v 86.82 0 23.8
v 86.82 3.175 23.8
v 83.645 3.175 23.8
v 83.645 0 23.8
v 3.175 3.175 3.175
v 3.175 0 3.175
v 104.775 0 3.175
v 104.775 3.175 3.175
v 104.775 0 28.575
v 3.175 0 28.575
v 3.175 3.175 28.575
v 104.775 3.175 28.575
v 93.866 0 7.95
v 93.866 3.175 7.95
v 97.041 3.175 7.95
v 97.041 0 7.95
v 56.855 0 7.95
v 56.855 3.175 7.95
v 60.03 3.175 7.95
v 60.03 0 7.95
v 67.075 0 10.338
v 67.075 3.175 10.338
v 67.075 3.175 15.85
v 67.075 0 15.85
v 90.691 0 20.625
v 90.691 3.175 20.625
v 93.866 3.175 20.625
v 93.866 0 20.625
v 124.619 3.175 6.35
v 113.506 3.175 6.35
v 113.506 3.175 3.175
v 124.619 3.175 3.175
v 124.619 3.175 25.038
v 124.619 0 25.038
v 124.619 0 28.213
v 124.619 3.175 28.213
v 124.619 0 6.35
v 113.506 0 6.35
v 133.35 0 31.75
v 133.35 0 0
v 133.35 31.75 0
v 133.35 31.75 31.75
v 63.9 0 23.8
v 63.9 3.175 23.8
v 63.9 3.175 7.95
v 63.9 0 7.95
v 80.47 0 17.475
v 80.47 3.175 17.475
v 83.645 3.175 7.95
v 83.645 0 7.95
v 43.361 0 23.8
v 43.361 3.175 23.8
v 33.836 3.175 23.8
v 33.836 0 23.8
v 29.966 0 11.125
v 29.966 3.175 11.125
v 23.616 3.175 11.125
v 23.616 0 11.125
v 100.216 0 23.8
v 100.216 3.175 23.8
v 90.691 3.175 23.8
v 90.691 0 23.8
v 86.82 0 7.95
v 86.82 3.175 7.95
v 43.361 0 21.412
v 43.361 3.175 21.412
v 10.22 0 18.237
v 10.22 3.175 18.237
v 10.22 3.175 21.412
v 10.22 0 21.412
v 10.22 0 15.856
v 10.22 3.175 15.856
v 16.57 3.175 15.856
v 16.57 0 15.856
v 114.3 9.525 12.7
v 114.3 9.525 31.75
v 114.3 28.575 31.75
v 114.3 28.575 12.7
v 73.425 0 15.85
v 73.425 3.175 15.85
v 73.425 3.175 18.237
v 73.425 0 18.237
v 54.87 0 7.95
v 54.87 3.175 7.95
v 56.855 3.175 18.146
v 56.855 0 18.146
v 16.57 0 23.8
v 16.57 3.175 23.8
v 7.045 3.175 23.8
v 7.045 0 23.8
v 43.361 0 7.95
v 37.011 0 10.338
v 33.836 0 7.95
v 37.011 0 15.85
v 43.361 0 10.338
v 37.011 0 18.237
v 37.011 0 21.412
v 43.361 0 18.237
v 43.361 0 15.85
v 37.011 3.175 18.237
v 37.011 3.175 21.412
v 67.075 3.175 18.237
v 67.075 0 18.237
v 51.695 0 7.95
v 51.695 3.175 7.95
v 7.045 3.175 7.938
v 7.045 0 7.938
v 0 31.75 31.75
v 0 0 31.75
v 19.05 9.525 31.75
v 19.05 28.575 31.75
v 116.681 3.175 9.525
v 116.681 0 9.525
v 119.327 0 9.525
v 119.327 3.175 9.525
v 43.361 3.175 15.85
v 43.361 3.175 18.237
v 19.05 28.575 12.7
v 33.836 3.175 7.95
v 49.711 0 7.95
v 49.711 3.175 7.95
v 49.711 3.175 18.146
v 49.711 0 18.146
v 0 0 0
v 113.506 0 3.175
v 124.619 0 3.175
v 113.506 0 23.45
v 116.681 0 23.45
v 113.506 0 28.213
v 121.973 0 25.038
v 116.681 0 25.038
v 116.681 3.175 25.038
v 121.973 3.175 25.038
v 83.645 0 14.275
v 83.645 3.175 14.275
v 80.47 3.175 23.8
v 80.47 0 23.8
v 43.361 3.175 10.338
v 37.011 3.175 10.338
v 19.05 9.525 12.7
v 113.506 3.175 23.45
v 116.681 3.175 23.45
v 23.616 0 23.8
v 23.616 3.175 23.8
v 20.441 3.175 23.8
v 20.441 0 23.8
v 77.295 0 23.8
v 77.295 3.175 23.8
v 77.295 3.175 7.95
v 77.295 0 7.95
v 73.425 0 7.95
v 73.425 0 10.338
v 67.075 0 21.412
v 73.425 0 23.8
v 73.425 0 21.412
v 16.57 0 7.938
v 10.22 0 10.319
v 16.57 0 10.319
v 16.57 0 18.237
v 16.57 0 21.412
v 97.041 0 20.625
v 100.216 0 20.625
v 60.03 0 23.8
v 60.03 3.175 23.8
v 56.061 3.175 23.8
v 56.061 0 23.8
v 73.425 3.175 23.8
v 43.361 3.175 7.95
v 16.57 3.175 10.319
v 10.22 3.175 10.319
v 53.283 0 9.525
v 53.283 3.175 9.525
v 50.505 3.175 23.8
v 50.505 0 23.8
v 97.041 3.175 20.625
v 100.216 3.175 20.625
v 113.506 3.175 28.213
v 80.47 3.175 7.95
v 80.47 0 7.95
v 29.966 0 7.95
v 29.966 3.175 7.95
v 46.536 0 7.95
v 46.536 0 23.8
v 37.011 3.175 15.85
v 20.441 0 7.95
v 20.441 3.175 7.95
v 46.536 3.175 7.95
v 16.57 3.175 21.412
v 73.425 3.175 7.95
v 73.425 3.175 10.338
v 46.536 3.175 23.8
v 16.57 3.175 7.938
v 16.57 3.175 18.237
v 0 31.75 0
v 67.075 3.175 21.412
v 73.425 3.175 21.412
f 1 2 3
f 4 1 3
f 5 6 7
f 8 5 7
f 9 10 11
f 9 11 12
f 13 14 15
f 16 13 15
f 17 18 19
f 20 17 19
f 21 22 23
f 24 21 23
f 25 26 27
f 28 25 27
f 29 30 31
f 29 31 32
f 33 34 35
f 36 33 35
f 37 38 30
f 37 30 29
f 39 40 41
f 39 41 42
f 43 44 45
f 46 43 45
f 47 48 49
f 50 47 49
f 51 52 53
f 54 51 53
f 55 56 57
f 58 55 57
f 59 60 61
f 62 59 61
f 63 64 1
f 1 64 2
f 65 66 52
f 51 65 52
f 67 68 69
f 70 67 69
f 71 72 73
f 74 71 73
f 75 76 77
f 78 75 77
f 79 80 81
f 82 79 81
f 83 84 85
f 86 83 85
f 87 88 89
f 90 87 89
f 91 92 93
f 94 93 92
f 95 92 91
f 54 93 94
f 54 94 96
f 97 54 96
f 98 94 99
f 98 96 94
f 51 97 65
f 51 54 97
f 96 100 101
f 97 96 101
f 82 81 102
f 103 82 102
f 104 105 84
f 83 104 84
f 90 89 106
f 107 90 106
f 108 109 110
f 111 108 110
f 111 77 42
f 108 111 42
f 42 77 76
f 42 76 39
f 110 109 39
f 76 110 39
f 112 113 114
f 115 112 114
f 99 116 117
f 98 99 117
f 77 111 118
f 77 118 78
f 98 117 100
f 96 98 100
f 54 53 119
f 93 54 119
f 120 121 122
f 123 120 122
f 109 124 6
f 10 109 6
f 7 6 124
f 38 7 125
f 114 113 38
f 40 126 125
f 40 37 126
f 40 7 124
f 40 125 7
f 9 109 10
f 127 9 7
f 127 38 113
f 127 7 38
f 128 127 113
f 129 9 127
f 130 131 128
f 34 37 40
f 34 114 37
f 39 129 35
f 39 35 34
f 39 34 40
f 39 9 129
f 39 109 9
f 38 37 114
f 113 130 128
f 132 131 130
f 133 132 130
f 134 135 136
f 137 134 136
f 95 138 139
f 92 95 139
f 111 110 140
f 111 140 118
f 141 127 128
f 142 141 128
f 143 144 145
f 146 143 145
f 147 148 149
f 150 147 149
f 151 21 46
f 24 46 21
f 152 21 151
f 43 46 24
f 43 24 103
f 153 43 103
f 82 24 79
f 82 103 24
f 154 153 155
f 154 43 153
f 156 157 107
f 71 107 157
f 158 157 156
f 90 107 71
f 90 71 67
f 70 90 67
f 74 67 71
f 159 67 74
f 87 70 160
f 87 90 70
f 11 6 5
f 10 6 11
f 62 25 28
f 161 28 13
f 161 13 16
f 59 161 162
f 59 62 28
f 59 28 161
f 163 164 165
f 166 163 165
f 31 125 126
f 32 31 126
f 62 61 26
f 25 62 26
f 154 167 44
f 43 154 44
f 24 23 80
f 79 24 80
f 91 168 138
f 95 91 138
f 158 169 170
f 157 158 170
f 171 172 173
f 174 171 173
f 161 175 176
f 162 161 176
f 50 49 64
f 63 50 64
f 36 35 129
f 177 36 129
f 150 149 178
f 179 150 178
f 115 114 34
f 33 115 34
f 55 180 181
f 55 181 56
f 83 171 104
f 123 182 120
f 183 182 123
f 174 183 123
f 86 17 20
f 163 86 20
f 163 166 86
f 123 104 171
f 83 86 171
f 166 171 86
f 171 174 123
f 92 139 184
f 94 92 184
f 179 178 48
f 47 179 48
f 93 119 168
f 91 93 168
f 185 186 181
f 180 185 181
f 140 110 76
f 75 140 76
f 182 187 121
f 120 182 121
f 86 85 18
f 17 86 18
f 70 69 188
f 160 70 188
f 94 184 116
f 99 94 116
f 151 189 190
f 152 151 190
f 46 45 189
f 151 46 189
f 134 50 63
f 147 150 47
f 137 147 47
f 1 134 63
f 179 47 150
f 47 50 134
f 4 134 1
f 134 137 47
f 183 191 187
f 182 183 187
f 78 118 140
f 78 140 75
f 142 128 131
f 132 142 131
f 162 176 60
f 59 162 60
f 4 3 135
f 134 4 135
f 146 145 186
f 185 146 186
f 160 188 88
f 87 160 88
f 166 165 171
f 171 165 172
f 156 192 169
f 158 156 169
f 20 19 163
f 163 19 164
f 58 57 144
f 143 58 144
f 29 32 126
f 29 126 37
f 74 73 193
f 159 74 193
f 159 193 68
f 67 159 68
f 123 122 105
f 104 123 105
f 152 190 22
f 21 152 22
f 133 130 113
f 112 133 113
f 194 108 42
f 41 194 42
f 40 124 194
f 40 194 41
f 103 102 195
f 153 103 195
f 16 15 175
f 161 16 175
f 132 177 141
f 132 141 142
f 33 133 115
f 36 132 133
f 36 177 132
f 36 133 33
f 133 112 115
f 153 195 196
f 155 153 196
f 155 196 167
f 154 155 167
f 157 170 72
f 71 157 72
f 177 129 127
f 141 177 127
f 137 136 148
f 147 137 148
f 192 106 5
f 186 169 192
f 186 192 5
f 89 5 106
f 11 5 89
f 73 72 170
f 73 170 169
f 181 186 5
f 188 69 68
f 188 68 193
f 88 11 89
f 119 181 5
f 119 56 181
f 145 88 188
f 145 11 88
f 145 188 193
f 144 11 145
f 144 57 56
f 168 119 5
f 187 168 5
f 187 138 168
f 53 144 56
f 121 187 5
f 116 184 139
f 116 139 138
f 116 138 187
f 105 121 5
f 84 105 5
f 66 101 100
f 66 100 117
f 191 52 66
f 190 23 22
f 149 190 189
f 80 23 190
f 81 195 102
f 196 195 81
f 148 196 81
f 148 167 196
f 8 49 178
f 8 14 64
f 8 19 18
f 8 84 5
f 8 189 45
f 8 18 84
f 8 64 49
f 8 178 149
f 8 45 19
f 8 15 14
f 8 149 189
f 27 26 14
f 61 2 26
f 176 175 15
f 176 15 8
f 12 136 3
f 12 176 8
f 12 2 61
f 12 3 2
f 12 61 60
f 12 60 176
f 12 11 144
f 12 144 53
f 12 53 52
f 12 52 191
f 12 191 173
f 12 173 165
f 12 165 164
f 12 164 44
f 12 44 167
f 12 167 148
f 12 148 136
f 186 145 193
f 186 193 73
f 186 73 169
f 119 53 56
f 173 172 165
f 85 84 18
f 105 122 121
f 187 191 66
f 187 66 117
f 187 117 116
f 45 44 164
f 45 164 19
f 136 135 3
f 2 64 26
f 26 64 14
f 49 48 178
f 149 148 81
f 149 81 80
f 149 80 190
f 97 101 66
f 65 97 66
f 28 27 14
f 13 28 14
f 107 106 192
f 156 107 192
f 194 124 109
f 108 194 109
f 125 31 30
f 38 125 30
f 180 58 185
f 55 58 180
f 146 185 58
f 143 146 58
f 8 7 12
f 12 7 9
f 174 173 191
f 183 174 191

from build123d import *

# Parameters (mm, degrees)
F0_W      = 133.35
F0_H      = 31.75
F1_DEPTH  = 31.75
F2_W      = 101.6
F2_H      = 25.4
F3_DEPTH  = 3.175
F5_DEPTH  = 3.175
F6_W      = 11.1125
F6_H      = 3.175
F7_DEPTH  = 3.175
F9_DEPTH  = 3.175
F11_DEPTH = 3.175
F14_DEPTH = 3.175
F15_DEPTH = 3.175
F17_DEPTH = 3.175
F19_DEPTH = 3.175
F21_DEPTH = 3.175
F22_W     = 95.25
F22_H     = 19.05
F23_DEPTH = 19.05


with BuildPart() as f1:
    # F0 (on Front) → F1 (new body)
    with BuildSketch(Plane.XZ):
        with Locations((66.675, 15.875)):
            Rectangle(F0_W, F0_H)
    extrude(amount=-F1_DEPTH)

    # F2 (on face) → F3 (cut)
    with BuildSketch(Plane.XZ):
        with Locations((53.975, 15.875)):
            Rectangle(F2_W, F2_H)
    extrude(amount=-F3_DEPTH, mode=Mode.SUBTRACT)

    # F4 (on face) → F5 (join)
    with BuildSketch(Plane.XZ.offset(-3.175)):
        Polygon((16.570325, 23.7998), (7.045325, 23.7998), (7.045325, 7.9375), (16.570325, 7.9375), (16.570325, 10.31875), (10.220325, 10.31875), (10.220325, 15.85595), (16.570325, 15.85595), (16.570325, 18.2372), (10.220325, 18.2372), (10.220325, 21.4122), (16.570325, 21.4122), align=None)
    extrude(amount=F5_DEPTH)

    # F6 (on face) → F7 (cut)
    with BuildSketch(Plane.XZ):
        with Locations((119.0625, 4.7625)):
            Rectangle(F6_W, F6_H)
    extrude(amount=-F7_DEPTH, mode=Mode.SUBTRACT)

    # F8 (on face) → F9 (cut)
    with BuildSketch(Plane.XZ):
        Polygon((124.61875, 28.212538), (113.50625, 28.212538), (113.50625, 23.450038), (116.68125, 23.450038), (116.68125, 25.037538), (121.972917, 25.037538), (116.68125, 9.525), (119.327083, 9.525), (124.61875, 25.037538), align=None)
    extrude(amount=-F9_DEPTH, mode=Mode.SUBTRACT)

    # F10 (on face) → F11 (join)
    with BuildSketch(Plane.XZ.offset(-3.175)):
        Polygon((23.61565, 23.7998), (20.44065, 23.7998), (20.44065, 7.9502), (29.96565, 7.9502), (29.96565, 11.1252), (23.61565, 11.1252), align=None)
    extrude(amount=F11_DEPTH)

    # F13 (on face) → F14 (join)
    with BuildSketch(Plane.XZ.offset(-3.175)):
        Polygon((43.360975, 23.7998), (33.835975, 23.7998), (33.835975, 7.9502), (43.360975, 7.9502), (43.360975, 10.3378), (37.010975, 10.3378), (37.010975, 15.8496), (43.360975, 15.8496), (43.360975, 18.2372), (37.010975, 18.2372), (37.010975, 21.4122), (43.360975, 21.4122), align=None)
    extrude(amount=F14_DEPTH)

    # F12 (on face) → F15 (join)
    with BuildSketch(Plane.XZ.offset(-3.175)):
        Polygon((50.504725, 23.7998), (46.535975, 23.7998), (46.535975, 7.9502), (49.710975, 7.9502), (49.710975, 18.146486), (51.69535, 7.9502), (54.87035, 7.9502), (56.854725, 18.146486), (56.854725, 7.9502), (60.029725, 7.9502), (60.029725, 23.7998), (56.060975, 23.7998), (53.28285, 9.525), align=None)
    extrude(amount=F15_DEPTH)

    # F16 (on face) → F17 (join)
    with BuildSketch(Plane.XZ.offset(-3.175)):
        Polygon((73.42505, 23.7998), (63.90005, 23.7998), (63.90005, 7.9502), (73.42505, 7.9502), (73.42505, 10.3378), (67.07505, 10.3378), (67.07505, 15.8496), (73.42505, 15.8496), (73.42505, 18.2372), (67.07505, 18.2372), (67.07505, 21.4122), (73.42505, 21.4122), align=None)
    extrude(amount=F17_DEPTH)

    # F18 (on face) → F19 (join)
    with BuildSketch(Plane.XZ.offset(-3.175)):
        Polygon((80.470375, 23.7998), (77.295375, 23.7998), (77.295375, 7.9502), (80.470375, 7.9502), (80.470375, 17.4752), (83.645375, 7.9502), (86.820375, 7.9502), (86.820375, 23.7998), (83.645375, 23.7998), (83.645375, 14.2748), align=None)
    extrude(amount=F19_DEPTH)

    # F20 (on face) → F21 (join)
    with BuildSketch(Plane.XZ.offset(-3.175)):
        Polygon((100.2157, 23.7998), (90.6907, 23.7998), (90.6907, 20.6248), (93.8657, 20.6248), (93.8657, 7.9502), (97.0407, 7.9502), (97.0407, 20.6248), (100.2157, 20.6248), align=None)
    extrude(amount=F21_DEPTH)

    # F22 (on face) → F23 (cut)
    with BuildSketch(Plane.XY.offset(31.75)):
        with Locations((66.675, 19.05)):
            Rectangle(F22_W, F22_H)
    extrude(amount=-F23_DEPTH, mode=Mode.SUBTRACT)


solid = f1.part
